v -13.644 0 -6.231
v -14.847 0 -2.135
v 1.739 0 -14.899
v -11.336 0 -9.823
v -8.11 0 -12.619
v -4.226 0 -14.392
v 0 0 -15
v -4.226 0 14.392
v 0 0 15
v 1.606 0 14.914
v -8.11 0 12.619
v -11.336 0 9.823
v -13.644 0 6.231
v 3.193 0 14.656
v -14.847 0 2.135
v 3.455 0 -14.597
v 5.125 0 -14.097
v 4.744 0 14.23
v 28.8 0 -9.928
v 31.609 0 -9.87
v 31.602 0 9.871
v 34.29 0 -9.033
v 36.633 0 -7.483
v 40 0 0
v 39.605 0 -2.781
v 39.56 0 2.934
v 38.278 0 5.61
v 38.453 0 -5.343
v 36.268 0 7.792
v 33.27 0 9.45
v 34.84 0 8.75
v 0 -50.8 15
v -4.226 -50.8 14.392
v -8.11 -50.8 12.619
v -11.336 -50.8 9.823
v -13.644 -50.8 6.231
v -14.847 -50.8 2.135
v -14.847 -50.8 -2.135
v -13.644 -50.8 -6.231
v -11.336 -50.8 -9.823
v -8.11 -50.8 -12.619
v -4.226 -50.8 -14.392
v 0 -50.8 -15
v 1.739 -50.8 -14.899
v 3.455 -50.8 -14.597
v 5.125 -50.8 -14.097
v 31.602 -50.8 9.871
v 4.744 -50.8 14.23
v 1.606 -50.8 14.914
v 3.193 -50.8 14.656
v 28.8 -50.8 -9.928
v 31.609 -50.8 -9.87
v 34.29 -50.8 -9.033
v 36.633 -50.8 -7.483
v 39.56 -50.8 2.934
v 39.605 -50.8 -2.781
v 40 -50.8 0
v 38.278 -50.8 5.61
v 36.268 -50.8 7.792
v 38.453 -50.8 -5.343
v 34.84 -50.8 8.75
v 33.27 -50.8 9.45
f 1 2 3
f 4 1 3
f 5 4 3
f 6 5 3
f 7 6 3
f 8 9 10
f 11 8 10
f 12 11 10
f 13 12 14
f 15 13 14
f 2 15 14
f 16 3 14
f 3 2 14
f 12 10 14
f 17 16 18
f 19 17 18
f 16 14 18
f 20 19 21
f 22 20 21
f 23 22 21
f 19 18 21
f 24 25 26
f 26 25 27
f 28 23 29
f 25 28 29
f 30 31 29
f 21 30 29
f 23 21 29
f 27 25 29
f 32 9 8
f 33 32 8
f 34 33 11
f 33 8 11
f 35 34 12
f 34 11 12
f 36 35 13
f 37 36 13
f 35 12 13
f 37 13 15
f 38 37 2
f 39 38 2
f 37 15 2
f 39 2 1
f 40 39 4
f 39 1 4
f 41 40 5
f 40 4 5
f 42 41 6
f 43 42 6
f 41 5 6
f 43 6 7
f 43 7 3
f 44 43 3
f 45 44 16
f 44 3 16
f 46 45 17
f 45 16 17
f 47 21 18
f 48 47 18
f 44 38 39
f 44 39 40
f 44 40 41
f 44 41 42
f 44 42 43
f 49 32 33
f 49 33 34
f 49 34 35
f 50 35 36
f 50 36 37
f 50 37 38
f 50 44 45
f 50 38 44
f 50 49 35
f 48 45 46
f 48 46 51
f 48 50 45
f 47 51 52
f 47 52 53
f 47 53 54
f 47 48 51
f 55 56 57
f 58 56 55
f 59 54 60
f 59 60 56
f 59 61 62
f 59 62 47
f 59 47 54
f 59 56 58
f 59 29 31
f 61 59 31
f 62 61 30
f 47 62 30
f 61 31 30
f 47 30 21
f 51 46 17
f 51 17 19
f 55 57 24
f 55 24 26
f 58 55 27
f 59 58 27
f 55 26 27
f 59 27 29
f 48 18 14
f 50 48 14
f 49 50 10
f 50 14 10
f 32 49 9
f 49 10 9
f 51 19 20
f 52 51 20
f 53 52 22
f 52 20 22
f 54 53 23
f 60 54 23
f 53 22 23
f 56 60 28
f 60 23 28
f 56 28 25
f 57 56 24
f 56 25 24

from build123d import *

# Parameters (mm, degrees)
F1_DEPTH = 50.8


with BuildPart() as f1:
    # F0 (on Front) → F1 (new body)
    with BuildSketch(Plane.XZ):
        with BuildLine():
            Line((4.744167, 14.229999), (0, 15))
            ThreePointArc((0, 15), (-15, 0), (0, -15))
            Line((0, -15), (5.124627, -14.097454))
            ThreePointArc((5.124627, -14.097454), (12.285548, -8.60612), (15, 0))
            ThreePointArc((15, 0), (12.168864, 8.770333), (4.744167, 14.229999))
        make_face()
        with BuildLine():
            ThreePointArc((4.744167, 14.229999), (2.403124, 14.806248), (0, 15))
            Line((0, 15), (4.744167, 14.229999))
        make_face()
        with BuildLine():
            Line((5.124627, -14.097454), (0, -15))
            ThreePointArc((0, -15), (2.601749, -14.77264), (5.124627, -14.097454))
        make_face()
        with BuildLine():
            Line((31.602083, 9.870832), (4.744167, 14.229999))
            ThreePointArc((4.744167, 14.229999), (12.168864, 8.770333), (15, 0))
            ThreePointArc((15, 0), (12.285548, -8.60612), (5.124627, -14.097454))
            Line((5.124627, -14.097454), (28.800074, -9.927748))
            ThreePointArc((28.800074, -9.927748), (20.098668, 1.401293), (31.602083, 9.870832))
        make_face()
        with BuildLine():
            ThreePointArc((36.268126, 7.7917), (34.070104, 9.134235), (31.602083, 9.870832))
            ThreePointArc((31.602083, 9.870832), (20.098668, 1.401293), (28.800074, -9.927748))
            ThreePointArc((28.800074, -9.927748), (36.633277, -7.48329), (40, 0))
            ThreePointArc((40, 0), (39.018904, 4.319649), (36.268126, 7.7917))
        make_face()
    extrude(amount=F1_DEPTH)


solid = f1.part
